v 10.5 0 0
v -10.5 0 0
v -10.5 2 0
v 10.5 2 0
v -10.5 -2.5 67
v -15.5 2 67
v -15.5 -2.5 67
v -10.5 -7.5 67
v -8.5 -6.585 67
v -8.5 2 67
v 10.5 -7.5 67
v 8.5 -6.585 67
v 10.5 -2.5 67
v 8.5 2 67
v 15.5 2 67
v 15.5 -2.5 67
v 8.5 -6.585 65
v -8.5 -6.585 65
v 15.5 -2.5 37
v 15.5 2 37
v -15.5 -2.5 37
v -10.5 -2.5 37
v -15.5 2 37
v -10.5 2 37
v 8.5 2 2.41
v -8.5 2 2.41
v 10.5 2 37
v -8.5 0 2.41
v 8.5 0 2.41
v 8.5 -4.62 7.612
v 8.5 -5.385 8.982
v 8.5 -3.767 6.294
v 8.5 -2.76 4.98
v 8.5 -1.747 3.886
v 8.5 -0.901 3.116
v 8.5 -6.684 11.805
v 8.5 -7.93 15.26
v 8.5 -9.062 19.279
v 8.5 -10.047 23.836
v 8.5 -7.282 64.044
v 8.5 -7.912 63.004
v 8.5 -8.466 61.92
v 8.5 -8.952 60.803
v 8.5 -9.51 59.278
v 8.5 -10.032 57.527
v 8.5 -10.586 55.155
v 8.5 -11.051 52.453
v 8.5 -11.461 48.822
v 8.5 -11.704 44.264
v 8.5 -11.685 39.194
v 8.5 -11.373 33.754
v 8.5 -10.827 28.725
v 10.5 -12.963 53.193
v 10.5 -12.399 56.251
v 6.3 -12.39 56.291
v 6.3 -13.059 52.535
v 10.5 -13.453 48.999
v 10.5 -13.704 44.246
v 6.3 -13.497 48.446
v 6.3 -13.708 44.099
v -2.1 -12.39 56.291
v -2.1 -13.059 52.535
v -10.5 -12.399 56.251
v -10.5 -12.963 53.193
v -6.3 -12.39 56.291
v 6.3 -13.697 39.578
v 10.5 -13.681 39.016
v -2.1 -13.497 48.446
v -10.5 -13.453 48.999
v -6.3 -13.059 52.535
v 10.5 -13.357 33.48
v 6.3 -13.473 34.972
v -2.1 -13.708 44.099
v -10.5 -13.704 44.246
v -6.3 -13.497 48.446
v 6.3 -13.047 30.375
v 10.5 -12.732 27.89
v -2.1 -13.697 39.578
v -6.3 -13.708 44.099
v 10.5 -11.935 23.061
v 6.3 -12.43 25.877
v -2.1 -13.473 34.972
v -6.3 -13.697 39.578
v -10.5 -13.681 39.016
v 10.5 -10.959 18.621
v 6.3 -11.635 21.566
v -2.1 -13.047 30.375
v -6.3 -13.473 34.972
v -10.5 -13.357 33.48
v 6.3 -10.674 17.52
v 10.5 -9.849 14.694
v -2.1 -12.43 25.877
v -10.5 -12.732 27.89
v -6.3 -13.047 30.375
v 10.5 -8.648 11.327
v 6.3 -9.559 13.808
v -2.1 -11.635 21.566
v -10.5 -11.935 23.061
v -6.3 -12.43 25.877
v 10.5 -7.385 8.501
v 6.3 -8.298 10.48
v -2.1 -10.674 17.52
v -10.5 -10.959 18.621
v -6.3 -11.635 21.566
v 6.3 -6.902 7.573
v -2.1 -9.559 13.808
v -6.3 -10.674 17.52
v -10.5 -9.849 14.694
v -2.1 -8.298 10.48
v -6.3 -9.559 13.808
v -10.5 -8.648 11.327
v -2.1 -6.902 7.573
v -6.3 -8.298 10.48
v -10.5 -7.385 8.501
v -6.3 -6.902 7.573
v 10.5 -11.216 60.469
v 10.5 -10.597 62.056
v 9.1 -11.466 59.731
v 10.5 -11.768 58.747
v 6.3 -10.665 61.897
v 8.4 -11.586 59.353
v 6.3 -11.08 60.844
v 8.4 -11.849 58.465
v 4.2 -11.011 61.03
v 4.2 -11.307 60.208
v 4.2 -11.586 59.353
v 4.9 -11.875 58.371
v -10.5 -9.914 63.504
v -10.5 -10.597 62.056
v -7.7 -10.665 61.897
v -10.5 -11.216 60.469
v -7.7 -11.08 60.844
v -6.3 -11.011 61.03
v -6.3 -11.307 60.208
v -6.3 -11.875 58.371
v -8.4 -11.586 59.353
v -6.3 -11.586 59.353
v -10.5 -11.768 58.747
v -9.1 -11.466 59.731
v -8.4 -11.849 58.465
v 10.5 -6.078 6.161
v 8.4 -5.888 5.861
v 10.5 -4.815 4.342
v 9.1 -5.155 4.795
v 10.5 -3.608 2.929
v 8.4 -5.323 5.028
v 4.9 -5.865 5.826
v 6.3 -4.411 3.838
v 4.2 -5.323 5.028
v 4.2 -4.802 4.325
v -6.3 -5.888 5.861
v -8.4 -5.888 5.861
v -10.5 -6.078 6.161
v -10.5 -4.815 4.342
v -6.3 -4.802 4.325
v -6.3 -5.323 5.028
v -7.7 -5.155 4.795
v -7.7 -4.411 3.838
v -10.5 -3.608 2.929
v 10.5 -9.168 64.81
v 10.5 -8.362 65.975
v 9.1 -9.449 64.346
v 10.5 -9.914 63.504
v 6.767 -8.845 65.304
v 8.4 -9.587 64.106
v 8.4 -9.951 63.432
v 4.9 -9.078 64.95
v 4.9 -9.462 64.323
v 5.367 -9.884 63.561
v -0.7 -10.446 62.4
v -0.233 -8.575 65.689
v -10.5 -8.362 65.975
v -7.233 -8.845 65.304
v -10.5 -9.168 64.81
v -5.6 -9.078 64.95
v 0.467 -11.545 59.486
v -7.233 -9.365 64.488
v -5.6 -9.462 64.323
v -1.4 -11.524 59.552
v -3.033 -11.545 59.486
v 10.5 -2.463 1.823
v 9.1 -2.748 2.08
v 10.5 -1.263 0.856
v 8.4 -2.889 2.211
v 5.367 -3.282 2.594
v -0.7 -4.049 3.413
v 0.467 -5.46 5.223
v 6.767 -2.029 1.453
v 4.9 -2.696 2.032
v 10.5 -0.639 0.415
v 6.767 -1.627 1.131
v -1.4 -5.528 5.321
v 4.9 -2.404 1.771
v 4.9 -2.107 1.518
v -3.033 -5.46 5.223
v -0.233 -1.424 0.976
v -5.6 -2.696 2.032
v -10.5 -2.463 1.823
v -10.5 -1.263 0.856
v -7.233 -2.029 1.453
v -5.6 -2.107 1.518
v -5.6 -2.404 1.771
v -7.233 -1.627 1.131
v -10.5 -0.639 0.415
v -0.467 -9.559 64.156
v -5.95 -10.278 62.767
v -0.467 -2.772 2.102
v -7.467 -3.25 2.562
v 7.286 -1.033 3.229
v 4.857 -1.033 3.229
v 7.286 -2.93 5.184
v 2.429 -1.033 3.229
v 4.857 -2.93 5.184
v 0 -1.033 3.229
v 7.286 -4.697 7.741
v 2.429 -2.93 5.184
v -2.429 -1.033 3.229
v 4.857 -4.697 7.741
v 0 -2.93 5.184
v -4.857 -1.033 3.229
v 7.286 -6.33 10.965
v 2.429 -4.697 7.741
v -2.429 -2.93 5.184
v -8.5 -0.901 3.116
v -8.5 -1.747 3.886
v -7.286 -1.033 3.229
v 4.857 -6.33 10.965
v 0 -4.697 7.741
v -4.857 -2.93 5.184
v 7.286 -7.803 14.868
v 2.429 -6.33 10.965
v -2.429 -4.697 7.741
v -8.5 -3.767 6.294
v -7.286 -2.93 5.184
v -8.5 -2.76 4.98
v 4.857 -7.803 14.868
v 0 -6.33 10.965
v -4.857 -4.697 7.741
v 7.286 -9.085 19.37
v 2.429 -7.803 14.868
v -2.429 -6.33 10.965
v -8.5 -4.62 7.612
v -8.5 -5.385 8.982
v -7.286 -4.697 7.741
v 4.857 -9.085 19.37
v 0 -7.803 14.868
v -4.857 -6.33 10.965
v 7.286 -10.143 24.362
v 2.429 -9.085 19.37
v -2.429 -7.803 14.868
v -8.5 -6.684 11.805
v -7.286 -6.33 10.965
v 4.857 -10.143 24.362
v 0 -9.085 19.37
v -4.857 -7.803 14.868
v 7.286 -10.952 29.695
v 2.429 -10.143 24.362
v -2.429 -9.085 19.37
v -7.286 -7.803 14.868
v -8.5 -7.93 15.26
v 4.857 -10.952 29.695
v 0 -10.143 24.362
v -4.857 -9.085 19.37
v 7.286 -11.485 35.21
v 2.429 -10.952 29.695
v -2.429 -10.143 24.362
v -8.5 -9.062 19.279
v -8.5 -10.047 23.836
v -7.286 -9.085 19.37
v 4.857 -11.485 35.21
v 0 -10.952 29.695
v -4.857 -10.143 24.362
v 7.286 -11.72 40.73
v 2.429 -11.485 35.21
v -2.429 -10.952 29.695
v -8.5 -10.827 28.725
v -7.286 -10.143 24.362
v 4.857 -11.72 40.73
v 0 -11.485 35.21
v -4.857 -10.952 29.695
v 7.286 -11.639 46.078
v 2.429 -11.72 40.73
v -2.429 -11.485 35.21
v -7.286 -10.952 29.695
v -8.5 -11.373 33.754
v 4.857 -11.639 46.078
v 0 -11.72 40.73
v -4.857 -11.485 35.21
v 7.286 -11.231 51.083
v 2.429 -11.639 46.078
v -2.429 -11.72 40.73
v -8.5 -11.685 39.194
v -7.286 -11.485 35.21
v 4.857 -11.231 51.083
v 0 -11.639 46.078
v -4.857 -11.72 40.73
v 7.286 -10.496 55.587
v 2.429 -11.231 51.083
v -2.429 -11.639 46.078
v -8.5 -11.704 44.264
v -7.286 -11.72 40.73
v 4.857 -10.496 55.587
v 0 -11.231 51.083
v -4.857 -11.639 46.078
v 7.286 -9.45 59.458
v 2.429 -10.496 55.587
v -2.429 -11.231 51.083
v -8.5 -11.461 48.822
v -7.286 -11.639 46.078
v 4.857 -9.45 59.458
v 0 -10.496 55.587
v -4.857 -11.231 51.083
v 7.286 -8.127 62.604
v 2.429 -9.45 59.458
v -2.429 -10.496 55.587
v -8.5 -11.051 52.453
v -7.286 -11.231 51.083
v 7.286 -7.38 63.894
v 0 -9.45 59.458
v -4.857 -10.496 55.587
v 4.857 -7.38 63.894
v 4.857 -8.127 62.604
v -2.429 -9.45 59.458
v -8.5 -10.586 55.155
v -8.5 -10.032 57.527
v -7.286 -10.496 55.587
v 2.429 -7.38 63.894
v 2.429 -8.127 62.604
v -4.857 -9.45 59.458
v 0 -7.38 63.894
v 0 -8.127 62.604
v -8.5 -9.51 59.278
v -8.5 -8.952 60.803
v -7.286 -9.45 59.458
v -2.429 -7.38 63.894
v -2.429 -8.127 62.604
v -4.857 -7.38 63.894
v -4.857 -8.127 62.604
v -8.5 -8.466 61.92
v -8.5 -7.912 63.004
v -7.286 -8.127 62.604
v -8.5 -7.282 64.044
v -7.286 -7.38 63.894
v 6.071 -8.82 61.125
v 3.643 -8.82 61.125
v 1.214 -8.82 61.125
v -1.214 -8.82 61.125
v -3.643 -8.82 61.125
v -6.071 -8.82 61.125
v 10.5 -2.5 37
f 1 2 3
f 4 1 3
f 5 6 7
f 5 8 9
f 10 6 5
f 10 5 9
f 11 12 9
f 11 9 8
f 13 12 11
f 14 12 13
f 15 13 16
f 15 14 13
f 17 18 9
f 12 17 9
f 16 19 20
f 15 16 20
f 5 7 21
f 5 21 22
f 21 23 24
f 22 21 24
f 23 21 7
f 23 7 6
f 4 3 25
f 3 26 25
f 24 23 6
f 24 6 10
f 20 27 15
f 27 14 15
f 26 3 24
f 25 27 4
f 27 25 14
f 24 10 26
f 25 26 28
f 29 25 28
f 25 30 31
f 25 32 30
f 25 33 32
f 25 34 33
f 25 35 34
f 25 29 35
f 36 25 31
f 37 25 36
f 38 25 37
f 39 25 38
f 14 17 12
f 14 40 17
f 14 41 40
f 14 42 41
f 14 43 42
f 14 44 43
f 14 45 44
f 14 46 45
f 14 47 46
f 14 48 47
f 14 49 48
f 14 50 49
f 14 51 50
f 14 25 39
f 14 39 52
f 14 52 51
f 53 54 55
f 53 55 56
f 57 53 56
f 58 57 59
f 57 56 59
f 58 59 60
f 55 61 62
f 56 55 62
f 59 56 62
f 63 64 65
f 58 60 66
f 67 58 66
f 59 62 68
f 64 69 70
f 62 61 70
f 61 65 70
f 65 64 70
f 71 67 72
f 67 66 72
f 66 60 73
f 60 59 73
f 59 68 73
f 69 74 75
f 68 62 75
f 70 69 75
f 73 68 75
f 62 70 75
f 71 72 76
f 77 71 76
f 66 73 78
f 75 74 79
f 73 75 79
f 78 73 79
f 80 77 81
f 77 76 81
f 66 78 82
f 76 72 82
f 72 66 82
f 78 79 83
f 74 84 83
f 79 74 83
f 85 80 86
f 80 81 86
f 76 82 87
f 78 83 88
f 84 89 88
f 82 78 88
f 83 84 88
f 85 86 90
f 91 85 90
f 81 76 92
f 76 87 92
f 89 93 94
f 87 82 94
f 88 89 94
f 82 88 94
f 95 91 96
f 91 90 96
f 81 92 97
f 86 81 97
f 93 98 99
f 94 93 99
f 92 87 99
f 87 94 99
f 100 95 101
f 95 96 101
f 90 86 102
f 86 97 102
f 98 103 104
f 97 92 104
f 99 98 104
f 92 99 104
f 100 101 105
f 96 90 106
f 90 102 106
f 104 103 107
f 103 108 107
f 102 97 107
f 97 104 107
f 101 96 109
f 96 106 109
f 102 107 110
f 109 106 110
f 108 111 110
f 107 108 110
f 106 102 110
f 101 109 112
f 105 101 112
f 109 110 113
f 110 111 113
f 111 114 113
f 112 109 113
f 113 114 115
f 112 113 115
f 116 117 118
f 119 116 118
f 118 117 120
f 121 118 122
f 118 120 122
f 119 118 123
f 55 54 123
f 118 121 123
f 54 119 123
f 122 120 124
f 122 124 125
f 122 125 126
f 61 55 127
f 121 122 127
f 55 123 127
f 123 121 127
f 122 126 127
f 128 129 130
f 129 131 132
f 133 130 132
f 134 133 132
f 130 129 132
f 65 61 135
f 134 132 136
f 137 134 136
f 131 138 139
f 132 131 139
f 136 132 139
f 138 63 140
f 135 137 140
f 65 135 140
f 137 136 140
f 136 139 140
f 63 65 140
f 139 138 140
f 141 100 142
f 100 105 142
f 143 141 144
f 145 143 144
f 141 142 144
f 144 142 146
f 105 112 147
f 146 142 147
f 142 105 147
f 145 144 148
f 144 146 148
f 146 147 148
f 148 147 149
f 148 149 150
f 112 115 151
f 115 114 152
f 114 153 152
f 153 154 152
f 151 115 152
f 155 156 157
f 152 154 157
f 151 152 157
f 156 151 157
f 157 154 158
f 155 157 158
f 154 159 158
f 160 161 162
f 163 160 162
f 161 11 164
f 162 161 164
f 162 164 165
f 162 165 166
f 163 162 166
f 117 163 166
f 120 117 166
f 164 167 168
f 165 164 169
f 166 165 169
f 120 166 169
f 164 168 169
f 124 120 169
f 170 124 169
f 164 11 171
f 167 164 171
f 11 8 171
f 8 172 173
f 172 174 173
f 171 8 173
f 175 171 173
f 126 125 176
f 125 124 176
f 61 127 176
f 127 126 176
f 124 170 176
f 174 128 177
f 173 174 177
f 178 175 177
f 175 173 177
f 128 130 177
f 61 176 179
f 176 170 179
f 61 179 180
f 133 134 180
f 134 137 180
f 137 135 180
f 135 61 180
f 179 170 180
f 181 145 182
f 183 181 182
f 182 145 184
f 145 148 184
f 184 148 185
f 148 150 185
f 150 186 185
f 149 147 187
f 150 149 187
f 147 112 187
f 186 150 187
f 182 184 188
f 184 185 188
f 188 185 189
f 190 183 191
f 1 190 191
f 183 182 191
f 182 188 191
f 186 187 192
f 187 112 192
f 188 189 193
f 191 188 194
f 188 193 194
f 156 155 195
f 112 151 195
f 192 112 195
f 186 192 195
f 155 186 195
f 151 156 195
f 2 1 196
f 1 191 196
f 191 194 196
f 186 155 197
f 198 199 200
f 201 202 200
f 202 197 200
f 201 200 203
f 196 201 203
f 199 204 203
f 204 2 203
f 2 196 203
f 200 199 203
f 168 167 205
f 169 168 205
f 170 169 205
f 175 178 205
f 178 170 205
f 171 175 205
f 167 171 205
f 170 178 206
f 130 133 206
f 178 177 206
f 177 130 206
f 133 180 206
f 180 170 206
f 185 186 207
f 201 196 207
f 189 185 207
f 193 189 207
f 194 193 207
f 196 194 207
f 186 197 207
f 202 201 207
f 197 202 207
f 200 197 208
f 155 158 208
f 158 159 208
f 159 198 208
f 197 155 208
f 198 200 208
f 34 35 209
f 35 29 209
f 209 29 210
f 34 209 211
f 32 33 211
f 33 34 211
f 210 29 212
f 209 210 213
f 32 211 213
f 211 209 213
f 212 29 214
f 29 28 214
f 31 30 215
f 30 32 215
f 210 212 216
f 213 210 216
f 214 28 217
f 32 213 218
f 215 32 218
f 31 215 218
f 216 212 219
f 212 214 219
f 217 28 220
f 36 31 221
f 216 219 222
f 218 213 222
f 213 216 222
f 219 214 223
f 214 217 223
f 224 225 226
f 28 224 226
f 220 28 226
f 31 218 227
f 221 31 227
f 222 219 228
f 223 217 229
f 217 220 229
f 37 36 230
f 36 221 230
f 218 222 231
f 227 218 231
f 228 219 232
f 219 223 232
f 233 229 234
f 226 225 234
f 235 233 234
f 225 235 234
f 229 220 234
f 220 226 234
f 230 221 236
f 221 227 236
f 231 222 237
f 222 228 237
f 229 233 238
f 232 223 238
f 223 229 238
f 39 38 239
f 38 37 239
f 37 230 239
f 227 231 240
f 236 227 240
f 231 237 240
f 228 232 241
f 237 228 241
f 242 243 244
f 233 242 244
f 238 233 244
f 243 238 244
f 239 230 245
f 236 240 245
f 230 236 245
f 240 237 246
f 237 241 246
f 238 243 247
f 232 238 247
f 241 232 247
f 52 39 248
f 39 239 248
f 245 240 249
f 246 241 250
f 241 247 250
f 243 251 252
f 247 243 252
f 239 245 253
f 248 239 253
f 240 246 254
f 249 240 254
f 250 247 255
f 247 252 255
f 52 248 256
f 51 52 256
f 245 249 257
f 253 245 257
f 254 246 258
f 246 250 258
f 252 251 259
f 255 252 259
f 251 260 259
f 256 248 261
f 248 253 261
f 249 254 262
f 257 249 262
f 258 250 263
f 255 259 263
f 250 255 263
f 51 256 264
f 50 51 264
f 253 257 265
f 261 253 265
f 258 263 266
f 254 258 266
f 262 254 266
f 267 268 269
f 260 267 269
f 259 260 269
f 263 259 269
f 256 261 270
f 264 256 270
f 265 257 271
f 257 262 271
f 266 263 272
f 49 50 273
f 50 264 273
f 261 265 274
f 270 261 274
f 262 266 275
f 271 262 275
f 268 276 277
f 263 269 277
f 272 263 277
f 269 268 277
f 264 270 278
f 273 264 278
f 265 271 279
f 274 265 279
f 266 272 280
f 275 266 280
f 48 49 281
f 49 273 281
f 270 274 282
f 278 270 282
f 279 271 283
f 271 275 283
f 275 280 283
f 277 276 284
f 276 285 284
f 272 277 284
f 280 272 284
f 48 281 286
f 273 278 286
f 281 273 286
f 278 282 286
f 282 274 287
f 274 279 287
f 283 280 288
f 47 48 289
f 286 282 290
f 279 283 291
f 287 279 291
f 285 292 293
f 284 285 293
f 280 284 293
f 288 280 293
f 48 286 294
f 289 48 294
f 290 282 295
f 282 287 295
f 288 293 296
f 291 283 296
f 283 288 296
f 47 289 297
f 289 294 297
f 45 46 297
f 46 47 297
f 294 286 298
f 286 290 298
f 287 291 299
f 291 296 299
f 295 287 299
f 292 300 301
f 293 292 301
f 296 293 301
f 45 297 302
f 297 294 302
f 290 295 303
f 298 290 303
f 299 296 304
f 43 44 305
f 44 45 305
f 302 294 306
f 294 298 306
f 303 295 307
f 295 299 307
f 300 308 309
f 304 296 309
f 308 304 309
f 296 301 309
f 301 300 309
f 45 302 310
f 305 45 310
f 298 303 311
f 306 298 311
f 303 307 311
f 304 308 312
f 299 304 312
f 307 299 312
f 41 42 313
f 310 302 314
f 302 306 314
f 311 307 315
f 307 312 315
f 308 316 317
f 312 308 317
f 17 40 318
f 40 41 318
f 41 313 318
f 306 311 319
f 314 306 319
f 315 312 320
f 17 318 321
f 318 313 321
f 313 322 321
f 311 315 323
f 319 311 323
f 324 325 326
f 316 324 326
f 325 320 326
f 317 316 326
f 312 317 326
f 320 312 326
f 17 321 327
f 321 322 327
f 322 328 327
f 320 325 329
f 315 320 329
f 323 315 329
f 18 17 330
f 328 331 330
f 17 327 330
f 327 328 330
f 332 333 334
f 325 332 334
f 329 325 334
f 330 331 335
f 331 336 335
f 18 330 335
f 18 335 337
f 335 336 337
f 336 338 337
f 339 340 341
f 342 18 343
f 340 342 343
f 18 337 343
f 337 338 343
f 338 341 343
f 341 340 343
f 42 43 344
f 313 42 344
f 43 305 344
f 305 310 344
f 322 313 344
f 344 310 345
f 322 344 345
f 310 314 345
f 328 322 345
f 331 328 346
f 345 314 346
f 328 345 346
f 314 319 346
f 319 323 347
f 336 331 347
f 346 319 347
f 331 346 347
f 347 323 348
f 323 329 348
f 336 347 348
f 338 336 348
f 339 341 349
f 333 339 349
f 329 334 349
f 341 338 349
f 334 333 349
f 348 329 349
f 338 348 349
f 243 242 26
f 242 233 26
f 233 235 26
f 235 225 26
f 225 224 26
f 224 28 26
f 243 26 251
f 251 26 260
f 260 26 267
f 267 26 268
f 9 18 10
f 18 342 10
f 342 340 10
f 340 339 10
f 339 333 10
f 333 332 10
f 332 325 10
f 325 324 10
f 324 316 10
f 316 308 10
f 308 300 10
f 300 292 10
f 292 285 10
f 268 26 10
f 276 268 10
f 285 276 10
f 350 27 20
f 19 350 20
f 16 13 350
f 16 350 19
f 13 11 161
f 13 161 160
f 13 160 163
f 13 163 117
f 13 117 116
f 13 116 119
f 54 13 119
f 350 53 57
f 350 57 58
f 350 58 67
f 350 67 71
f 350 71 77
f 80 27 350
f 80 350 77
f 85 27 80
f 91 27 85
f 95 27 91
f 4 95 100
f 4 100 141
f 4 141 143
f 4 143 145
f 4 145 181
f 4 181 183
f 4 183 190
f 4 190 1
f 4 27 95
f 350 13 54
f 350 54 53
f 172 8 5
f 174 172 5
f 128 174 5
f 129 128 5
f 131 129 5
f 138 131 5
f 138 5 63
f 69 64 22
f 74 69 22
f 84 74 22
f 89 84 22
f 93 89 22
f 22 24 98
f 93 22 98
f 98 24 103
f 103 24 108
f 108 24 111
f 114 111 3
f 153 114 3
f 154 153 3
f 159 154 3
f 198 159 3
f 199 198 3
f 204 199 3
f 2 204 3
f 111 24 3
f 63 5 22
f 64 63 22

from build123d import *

# Parameters (mm, degrees)
BASEPIEDEAPPOGGIO_START = -10.5
BASEPIEDEAPPOGGIO_DEPTH = 21
LATOSINISTRO_DEPTH      = 2
SCHIZZO3_W              = 5
SCHIZZO3_H              = 4.5
ALETTEAGGANCIO_DEPTH    = 30


# Read off the part's stored shape, not the designer's step: BasePiedeAppoggio
with BuildPart() as part:
    # BasePiedeAppoggio outline → BasePiedeAppoggio (new body)
    with BuildSketch(Plane(origin=(0, 0, 0), x_dir=(0, 0, -1), z_dir=(1, 0, 0)).offset(BASEPIEDEAPPOGGIO_START)):
        with BuildLine():
            Line((-67, -6.58541733), (-67, -7.5))
            add(Edge.make_bspline(
                [(-67, -7.5), (-60, -14), (-44, -17), (-14, -13), (-5, -8), (0, 0)],
                knots=[0, 0, 0, 0, 0, 0, 1, 1, 1, 1, 1, 1], degree=5))
            Line((0, 0), (0, 2))
            Line((0, 2), (-2.409917527, 2))
            Line((-2.409917527, 2), (-2.409917527, 0))
            add(Edge.make_bspline(
                [(-2.409917527, 0), (-2.667324323, -0.353402954), (-3.476108464, -1.377540434), (-5.718312008, -3.574118885), (-10.497685703, -6.435761001), (-19.037438877, -9.233820798), (-29.572047533, -11.136431528), (-38.966676556, -11.799385995), (-46.135832891, -11.693755764), (-51.166703498, -11.28631183), (-55.693282116, -10.549034431), (-58.932001396, -9.671882802), (-61.157085706, -8.829738395), (-62.633910182, -8.137838289), (-63.931461685, -7.382278902), (-64.645771008, -6.869387628), (-65, -6.58541733)],
                knots=[0.030225408, 0.030225408, 0.030225408, 0.030225408, 0.061229523, 0.122459046, 0.244918093, 0.367377139, 0.489836186, 0.612295232, 0.673524756, 0.734754279, 0.795983802, 0.857213325, 0.887828087, 0.918442849, 0.94905761, 0.979672372, 0.979672372, 0.979672372, 0.979672372], degree=3))
            Line((-65, -6.58541733), (-67, -6.58541733))
        make_face()
    extrude(amount=BASEPIEDEAPPOGGIO_DEPTH)

    # Schizzo2 → LatoSinistro (add)
    with BuildSketch(Plane.ZY.offset(10.5)):
        with BuildLine():
            Line((67, -7.5), (67, 2))
            Line((67, 2), (0, 2))
            Line((0, 2), (0, 0))
            add(Edge.make_bspline(
                [(67, -7.5), (60, -14), (44, -17), (14, -13), (5, -8), (0, 0)],
                knots=[0, 0, 0, 0, 0, 0, 1, 1, 1, 1, 1, 1], degree=5))
        make_face()
    latosinistro = extrude(amount=-LATOSINISTRO_DEPTH)

    # LatoDestro: LatoSinistro across plane
    add(latosinistro.mirror(Plane(origin=(0, 0, 0), x_dir=(0, 0, 1), z_dir=(1, 0, 0))))

    # Schizzo3 → AletteAggancio (add)
    with BuildSketch(Plane.XY.offset(67)):
        with Locations((-13, -0.25)):
            Rectangle(SCHIZZO3_W, SCHIZZO3_H)
        with Locations((13, -0.25)):
            Rectangle(SCHIZZO3_W, SCHIZZO3_H)
    extrude(amount=-ALETTEAGGANCIO_DEPTH)


solid = part.part
